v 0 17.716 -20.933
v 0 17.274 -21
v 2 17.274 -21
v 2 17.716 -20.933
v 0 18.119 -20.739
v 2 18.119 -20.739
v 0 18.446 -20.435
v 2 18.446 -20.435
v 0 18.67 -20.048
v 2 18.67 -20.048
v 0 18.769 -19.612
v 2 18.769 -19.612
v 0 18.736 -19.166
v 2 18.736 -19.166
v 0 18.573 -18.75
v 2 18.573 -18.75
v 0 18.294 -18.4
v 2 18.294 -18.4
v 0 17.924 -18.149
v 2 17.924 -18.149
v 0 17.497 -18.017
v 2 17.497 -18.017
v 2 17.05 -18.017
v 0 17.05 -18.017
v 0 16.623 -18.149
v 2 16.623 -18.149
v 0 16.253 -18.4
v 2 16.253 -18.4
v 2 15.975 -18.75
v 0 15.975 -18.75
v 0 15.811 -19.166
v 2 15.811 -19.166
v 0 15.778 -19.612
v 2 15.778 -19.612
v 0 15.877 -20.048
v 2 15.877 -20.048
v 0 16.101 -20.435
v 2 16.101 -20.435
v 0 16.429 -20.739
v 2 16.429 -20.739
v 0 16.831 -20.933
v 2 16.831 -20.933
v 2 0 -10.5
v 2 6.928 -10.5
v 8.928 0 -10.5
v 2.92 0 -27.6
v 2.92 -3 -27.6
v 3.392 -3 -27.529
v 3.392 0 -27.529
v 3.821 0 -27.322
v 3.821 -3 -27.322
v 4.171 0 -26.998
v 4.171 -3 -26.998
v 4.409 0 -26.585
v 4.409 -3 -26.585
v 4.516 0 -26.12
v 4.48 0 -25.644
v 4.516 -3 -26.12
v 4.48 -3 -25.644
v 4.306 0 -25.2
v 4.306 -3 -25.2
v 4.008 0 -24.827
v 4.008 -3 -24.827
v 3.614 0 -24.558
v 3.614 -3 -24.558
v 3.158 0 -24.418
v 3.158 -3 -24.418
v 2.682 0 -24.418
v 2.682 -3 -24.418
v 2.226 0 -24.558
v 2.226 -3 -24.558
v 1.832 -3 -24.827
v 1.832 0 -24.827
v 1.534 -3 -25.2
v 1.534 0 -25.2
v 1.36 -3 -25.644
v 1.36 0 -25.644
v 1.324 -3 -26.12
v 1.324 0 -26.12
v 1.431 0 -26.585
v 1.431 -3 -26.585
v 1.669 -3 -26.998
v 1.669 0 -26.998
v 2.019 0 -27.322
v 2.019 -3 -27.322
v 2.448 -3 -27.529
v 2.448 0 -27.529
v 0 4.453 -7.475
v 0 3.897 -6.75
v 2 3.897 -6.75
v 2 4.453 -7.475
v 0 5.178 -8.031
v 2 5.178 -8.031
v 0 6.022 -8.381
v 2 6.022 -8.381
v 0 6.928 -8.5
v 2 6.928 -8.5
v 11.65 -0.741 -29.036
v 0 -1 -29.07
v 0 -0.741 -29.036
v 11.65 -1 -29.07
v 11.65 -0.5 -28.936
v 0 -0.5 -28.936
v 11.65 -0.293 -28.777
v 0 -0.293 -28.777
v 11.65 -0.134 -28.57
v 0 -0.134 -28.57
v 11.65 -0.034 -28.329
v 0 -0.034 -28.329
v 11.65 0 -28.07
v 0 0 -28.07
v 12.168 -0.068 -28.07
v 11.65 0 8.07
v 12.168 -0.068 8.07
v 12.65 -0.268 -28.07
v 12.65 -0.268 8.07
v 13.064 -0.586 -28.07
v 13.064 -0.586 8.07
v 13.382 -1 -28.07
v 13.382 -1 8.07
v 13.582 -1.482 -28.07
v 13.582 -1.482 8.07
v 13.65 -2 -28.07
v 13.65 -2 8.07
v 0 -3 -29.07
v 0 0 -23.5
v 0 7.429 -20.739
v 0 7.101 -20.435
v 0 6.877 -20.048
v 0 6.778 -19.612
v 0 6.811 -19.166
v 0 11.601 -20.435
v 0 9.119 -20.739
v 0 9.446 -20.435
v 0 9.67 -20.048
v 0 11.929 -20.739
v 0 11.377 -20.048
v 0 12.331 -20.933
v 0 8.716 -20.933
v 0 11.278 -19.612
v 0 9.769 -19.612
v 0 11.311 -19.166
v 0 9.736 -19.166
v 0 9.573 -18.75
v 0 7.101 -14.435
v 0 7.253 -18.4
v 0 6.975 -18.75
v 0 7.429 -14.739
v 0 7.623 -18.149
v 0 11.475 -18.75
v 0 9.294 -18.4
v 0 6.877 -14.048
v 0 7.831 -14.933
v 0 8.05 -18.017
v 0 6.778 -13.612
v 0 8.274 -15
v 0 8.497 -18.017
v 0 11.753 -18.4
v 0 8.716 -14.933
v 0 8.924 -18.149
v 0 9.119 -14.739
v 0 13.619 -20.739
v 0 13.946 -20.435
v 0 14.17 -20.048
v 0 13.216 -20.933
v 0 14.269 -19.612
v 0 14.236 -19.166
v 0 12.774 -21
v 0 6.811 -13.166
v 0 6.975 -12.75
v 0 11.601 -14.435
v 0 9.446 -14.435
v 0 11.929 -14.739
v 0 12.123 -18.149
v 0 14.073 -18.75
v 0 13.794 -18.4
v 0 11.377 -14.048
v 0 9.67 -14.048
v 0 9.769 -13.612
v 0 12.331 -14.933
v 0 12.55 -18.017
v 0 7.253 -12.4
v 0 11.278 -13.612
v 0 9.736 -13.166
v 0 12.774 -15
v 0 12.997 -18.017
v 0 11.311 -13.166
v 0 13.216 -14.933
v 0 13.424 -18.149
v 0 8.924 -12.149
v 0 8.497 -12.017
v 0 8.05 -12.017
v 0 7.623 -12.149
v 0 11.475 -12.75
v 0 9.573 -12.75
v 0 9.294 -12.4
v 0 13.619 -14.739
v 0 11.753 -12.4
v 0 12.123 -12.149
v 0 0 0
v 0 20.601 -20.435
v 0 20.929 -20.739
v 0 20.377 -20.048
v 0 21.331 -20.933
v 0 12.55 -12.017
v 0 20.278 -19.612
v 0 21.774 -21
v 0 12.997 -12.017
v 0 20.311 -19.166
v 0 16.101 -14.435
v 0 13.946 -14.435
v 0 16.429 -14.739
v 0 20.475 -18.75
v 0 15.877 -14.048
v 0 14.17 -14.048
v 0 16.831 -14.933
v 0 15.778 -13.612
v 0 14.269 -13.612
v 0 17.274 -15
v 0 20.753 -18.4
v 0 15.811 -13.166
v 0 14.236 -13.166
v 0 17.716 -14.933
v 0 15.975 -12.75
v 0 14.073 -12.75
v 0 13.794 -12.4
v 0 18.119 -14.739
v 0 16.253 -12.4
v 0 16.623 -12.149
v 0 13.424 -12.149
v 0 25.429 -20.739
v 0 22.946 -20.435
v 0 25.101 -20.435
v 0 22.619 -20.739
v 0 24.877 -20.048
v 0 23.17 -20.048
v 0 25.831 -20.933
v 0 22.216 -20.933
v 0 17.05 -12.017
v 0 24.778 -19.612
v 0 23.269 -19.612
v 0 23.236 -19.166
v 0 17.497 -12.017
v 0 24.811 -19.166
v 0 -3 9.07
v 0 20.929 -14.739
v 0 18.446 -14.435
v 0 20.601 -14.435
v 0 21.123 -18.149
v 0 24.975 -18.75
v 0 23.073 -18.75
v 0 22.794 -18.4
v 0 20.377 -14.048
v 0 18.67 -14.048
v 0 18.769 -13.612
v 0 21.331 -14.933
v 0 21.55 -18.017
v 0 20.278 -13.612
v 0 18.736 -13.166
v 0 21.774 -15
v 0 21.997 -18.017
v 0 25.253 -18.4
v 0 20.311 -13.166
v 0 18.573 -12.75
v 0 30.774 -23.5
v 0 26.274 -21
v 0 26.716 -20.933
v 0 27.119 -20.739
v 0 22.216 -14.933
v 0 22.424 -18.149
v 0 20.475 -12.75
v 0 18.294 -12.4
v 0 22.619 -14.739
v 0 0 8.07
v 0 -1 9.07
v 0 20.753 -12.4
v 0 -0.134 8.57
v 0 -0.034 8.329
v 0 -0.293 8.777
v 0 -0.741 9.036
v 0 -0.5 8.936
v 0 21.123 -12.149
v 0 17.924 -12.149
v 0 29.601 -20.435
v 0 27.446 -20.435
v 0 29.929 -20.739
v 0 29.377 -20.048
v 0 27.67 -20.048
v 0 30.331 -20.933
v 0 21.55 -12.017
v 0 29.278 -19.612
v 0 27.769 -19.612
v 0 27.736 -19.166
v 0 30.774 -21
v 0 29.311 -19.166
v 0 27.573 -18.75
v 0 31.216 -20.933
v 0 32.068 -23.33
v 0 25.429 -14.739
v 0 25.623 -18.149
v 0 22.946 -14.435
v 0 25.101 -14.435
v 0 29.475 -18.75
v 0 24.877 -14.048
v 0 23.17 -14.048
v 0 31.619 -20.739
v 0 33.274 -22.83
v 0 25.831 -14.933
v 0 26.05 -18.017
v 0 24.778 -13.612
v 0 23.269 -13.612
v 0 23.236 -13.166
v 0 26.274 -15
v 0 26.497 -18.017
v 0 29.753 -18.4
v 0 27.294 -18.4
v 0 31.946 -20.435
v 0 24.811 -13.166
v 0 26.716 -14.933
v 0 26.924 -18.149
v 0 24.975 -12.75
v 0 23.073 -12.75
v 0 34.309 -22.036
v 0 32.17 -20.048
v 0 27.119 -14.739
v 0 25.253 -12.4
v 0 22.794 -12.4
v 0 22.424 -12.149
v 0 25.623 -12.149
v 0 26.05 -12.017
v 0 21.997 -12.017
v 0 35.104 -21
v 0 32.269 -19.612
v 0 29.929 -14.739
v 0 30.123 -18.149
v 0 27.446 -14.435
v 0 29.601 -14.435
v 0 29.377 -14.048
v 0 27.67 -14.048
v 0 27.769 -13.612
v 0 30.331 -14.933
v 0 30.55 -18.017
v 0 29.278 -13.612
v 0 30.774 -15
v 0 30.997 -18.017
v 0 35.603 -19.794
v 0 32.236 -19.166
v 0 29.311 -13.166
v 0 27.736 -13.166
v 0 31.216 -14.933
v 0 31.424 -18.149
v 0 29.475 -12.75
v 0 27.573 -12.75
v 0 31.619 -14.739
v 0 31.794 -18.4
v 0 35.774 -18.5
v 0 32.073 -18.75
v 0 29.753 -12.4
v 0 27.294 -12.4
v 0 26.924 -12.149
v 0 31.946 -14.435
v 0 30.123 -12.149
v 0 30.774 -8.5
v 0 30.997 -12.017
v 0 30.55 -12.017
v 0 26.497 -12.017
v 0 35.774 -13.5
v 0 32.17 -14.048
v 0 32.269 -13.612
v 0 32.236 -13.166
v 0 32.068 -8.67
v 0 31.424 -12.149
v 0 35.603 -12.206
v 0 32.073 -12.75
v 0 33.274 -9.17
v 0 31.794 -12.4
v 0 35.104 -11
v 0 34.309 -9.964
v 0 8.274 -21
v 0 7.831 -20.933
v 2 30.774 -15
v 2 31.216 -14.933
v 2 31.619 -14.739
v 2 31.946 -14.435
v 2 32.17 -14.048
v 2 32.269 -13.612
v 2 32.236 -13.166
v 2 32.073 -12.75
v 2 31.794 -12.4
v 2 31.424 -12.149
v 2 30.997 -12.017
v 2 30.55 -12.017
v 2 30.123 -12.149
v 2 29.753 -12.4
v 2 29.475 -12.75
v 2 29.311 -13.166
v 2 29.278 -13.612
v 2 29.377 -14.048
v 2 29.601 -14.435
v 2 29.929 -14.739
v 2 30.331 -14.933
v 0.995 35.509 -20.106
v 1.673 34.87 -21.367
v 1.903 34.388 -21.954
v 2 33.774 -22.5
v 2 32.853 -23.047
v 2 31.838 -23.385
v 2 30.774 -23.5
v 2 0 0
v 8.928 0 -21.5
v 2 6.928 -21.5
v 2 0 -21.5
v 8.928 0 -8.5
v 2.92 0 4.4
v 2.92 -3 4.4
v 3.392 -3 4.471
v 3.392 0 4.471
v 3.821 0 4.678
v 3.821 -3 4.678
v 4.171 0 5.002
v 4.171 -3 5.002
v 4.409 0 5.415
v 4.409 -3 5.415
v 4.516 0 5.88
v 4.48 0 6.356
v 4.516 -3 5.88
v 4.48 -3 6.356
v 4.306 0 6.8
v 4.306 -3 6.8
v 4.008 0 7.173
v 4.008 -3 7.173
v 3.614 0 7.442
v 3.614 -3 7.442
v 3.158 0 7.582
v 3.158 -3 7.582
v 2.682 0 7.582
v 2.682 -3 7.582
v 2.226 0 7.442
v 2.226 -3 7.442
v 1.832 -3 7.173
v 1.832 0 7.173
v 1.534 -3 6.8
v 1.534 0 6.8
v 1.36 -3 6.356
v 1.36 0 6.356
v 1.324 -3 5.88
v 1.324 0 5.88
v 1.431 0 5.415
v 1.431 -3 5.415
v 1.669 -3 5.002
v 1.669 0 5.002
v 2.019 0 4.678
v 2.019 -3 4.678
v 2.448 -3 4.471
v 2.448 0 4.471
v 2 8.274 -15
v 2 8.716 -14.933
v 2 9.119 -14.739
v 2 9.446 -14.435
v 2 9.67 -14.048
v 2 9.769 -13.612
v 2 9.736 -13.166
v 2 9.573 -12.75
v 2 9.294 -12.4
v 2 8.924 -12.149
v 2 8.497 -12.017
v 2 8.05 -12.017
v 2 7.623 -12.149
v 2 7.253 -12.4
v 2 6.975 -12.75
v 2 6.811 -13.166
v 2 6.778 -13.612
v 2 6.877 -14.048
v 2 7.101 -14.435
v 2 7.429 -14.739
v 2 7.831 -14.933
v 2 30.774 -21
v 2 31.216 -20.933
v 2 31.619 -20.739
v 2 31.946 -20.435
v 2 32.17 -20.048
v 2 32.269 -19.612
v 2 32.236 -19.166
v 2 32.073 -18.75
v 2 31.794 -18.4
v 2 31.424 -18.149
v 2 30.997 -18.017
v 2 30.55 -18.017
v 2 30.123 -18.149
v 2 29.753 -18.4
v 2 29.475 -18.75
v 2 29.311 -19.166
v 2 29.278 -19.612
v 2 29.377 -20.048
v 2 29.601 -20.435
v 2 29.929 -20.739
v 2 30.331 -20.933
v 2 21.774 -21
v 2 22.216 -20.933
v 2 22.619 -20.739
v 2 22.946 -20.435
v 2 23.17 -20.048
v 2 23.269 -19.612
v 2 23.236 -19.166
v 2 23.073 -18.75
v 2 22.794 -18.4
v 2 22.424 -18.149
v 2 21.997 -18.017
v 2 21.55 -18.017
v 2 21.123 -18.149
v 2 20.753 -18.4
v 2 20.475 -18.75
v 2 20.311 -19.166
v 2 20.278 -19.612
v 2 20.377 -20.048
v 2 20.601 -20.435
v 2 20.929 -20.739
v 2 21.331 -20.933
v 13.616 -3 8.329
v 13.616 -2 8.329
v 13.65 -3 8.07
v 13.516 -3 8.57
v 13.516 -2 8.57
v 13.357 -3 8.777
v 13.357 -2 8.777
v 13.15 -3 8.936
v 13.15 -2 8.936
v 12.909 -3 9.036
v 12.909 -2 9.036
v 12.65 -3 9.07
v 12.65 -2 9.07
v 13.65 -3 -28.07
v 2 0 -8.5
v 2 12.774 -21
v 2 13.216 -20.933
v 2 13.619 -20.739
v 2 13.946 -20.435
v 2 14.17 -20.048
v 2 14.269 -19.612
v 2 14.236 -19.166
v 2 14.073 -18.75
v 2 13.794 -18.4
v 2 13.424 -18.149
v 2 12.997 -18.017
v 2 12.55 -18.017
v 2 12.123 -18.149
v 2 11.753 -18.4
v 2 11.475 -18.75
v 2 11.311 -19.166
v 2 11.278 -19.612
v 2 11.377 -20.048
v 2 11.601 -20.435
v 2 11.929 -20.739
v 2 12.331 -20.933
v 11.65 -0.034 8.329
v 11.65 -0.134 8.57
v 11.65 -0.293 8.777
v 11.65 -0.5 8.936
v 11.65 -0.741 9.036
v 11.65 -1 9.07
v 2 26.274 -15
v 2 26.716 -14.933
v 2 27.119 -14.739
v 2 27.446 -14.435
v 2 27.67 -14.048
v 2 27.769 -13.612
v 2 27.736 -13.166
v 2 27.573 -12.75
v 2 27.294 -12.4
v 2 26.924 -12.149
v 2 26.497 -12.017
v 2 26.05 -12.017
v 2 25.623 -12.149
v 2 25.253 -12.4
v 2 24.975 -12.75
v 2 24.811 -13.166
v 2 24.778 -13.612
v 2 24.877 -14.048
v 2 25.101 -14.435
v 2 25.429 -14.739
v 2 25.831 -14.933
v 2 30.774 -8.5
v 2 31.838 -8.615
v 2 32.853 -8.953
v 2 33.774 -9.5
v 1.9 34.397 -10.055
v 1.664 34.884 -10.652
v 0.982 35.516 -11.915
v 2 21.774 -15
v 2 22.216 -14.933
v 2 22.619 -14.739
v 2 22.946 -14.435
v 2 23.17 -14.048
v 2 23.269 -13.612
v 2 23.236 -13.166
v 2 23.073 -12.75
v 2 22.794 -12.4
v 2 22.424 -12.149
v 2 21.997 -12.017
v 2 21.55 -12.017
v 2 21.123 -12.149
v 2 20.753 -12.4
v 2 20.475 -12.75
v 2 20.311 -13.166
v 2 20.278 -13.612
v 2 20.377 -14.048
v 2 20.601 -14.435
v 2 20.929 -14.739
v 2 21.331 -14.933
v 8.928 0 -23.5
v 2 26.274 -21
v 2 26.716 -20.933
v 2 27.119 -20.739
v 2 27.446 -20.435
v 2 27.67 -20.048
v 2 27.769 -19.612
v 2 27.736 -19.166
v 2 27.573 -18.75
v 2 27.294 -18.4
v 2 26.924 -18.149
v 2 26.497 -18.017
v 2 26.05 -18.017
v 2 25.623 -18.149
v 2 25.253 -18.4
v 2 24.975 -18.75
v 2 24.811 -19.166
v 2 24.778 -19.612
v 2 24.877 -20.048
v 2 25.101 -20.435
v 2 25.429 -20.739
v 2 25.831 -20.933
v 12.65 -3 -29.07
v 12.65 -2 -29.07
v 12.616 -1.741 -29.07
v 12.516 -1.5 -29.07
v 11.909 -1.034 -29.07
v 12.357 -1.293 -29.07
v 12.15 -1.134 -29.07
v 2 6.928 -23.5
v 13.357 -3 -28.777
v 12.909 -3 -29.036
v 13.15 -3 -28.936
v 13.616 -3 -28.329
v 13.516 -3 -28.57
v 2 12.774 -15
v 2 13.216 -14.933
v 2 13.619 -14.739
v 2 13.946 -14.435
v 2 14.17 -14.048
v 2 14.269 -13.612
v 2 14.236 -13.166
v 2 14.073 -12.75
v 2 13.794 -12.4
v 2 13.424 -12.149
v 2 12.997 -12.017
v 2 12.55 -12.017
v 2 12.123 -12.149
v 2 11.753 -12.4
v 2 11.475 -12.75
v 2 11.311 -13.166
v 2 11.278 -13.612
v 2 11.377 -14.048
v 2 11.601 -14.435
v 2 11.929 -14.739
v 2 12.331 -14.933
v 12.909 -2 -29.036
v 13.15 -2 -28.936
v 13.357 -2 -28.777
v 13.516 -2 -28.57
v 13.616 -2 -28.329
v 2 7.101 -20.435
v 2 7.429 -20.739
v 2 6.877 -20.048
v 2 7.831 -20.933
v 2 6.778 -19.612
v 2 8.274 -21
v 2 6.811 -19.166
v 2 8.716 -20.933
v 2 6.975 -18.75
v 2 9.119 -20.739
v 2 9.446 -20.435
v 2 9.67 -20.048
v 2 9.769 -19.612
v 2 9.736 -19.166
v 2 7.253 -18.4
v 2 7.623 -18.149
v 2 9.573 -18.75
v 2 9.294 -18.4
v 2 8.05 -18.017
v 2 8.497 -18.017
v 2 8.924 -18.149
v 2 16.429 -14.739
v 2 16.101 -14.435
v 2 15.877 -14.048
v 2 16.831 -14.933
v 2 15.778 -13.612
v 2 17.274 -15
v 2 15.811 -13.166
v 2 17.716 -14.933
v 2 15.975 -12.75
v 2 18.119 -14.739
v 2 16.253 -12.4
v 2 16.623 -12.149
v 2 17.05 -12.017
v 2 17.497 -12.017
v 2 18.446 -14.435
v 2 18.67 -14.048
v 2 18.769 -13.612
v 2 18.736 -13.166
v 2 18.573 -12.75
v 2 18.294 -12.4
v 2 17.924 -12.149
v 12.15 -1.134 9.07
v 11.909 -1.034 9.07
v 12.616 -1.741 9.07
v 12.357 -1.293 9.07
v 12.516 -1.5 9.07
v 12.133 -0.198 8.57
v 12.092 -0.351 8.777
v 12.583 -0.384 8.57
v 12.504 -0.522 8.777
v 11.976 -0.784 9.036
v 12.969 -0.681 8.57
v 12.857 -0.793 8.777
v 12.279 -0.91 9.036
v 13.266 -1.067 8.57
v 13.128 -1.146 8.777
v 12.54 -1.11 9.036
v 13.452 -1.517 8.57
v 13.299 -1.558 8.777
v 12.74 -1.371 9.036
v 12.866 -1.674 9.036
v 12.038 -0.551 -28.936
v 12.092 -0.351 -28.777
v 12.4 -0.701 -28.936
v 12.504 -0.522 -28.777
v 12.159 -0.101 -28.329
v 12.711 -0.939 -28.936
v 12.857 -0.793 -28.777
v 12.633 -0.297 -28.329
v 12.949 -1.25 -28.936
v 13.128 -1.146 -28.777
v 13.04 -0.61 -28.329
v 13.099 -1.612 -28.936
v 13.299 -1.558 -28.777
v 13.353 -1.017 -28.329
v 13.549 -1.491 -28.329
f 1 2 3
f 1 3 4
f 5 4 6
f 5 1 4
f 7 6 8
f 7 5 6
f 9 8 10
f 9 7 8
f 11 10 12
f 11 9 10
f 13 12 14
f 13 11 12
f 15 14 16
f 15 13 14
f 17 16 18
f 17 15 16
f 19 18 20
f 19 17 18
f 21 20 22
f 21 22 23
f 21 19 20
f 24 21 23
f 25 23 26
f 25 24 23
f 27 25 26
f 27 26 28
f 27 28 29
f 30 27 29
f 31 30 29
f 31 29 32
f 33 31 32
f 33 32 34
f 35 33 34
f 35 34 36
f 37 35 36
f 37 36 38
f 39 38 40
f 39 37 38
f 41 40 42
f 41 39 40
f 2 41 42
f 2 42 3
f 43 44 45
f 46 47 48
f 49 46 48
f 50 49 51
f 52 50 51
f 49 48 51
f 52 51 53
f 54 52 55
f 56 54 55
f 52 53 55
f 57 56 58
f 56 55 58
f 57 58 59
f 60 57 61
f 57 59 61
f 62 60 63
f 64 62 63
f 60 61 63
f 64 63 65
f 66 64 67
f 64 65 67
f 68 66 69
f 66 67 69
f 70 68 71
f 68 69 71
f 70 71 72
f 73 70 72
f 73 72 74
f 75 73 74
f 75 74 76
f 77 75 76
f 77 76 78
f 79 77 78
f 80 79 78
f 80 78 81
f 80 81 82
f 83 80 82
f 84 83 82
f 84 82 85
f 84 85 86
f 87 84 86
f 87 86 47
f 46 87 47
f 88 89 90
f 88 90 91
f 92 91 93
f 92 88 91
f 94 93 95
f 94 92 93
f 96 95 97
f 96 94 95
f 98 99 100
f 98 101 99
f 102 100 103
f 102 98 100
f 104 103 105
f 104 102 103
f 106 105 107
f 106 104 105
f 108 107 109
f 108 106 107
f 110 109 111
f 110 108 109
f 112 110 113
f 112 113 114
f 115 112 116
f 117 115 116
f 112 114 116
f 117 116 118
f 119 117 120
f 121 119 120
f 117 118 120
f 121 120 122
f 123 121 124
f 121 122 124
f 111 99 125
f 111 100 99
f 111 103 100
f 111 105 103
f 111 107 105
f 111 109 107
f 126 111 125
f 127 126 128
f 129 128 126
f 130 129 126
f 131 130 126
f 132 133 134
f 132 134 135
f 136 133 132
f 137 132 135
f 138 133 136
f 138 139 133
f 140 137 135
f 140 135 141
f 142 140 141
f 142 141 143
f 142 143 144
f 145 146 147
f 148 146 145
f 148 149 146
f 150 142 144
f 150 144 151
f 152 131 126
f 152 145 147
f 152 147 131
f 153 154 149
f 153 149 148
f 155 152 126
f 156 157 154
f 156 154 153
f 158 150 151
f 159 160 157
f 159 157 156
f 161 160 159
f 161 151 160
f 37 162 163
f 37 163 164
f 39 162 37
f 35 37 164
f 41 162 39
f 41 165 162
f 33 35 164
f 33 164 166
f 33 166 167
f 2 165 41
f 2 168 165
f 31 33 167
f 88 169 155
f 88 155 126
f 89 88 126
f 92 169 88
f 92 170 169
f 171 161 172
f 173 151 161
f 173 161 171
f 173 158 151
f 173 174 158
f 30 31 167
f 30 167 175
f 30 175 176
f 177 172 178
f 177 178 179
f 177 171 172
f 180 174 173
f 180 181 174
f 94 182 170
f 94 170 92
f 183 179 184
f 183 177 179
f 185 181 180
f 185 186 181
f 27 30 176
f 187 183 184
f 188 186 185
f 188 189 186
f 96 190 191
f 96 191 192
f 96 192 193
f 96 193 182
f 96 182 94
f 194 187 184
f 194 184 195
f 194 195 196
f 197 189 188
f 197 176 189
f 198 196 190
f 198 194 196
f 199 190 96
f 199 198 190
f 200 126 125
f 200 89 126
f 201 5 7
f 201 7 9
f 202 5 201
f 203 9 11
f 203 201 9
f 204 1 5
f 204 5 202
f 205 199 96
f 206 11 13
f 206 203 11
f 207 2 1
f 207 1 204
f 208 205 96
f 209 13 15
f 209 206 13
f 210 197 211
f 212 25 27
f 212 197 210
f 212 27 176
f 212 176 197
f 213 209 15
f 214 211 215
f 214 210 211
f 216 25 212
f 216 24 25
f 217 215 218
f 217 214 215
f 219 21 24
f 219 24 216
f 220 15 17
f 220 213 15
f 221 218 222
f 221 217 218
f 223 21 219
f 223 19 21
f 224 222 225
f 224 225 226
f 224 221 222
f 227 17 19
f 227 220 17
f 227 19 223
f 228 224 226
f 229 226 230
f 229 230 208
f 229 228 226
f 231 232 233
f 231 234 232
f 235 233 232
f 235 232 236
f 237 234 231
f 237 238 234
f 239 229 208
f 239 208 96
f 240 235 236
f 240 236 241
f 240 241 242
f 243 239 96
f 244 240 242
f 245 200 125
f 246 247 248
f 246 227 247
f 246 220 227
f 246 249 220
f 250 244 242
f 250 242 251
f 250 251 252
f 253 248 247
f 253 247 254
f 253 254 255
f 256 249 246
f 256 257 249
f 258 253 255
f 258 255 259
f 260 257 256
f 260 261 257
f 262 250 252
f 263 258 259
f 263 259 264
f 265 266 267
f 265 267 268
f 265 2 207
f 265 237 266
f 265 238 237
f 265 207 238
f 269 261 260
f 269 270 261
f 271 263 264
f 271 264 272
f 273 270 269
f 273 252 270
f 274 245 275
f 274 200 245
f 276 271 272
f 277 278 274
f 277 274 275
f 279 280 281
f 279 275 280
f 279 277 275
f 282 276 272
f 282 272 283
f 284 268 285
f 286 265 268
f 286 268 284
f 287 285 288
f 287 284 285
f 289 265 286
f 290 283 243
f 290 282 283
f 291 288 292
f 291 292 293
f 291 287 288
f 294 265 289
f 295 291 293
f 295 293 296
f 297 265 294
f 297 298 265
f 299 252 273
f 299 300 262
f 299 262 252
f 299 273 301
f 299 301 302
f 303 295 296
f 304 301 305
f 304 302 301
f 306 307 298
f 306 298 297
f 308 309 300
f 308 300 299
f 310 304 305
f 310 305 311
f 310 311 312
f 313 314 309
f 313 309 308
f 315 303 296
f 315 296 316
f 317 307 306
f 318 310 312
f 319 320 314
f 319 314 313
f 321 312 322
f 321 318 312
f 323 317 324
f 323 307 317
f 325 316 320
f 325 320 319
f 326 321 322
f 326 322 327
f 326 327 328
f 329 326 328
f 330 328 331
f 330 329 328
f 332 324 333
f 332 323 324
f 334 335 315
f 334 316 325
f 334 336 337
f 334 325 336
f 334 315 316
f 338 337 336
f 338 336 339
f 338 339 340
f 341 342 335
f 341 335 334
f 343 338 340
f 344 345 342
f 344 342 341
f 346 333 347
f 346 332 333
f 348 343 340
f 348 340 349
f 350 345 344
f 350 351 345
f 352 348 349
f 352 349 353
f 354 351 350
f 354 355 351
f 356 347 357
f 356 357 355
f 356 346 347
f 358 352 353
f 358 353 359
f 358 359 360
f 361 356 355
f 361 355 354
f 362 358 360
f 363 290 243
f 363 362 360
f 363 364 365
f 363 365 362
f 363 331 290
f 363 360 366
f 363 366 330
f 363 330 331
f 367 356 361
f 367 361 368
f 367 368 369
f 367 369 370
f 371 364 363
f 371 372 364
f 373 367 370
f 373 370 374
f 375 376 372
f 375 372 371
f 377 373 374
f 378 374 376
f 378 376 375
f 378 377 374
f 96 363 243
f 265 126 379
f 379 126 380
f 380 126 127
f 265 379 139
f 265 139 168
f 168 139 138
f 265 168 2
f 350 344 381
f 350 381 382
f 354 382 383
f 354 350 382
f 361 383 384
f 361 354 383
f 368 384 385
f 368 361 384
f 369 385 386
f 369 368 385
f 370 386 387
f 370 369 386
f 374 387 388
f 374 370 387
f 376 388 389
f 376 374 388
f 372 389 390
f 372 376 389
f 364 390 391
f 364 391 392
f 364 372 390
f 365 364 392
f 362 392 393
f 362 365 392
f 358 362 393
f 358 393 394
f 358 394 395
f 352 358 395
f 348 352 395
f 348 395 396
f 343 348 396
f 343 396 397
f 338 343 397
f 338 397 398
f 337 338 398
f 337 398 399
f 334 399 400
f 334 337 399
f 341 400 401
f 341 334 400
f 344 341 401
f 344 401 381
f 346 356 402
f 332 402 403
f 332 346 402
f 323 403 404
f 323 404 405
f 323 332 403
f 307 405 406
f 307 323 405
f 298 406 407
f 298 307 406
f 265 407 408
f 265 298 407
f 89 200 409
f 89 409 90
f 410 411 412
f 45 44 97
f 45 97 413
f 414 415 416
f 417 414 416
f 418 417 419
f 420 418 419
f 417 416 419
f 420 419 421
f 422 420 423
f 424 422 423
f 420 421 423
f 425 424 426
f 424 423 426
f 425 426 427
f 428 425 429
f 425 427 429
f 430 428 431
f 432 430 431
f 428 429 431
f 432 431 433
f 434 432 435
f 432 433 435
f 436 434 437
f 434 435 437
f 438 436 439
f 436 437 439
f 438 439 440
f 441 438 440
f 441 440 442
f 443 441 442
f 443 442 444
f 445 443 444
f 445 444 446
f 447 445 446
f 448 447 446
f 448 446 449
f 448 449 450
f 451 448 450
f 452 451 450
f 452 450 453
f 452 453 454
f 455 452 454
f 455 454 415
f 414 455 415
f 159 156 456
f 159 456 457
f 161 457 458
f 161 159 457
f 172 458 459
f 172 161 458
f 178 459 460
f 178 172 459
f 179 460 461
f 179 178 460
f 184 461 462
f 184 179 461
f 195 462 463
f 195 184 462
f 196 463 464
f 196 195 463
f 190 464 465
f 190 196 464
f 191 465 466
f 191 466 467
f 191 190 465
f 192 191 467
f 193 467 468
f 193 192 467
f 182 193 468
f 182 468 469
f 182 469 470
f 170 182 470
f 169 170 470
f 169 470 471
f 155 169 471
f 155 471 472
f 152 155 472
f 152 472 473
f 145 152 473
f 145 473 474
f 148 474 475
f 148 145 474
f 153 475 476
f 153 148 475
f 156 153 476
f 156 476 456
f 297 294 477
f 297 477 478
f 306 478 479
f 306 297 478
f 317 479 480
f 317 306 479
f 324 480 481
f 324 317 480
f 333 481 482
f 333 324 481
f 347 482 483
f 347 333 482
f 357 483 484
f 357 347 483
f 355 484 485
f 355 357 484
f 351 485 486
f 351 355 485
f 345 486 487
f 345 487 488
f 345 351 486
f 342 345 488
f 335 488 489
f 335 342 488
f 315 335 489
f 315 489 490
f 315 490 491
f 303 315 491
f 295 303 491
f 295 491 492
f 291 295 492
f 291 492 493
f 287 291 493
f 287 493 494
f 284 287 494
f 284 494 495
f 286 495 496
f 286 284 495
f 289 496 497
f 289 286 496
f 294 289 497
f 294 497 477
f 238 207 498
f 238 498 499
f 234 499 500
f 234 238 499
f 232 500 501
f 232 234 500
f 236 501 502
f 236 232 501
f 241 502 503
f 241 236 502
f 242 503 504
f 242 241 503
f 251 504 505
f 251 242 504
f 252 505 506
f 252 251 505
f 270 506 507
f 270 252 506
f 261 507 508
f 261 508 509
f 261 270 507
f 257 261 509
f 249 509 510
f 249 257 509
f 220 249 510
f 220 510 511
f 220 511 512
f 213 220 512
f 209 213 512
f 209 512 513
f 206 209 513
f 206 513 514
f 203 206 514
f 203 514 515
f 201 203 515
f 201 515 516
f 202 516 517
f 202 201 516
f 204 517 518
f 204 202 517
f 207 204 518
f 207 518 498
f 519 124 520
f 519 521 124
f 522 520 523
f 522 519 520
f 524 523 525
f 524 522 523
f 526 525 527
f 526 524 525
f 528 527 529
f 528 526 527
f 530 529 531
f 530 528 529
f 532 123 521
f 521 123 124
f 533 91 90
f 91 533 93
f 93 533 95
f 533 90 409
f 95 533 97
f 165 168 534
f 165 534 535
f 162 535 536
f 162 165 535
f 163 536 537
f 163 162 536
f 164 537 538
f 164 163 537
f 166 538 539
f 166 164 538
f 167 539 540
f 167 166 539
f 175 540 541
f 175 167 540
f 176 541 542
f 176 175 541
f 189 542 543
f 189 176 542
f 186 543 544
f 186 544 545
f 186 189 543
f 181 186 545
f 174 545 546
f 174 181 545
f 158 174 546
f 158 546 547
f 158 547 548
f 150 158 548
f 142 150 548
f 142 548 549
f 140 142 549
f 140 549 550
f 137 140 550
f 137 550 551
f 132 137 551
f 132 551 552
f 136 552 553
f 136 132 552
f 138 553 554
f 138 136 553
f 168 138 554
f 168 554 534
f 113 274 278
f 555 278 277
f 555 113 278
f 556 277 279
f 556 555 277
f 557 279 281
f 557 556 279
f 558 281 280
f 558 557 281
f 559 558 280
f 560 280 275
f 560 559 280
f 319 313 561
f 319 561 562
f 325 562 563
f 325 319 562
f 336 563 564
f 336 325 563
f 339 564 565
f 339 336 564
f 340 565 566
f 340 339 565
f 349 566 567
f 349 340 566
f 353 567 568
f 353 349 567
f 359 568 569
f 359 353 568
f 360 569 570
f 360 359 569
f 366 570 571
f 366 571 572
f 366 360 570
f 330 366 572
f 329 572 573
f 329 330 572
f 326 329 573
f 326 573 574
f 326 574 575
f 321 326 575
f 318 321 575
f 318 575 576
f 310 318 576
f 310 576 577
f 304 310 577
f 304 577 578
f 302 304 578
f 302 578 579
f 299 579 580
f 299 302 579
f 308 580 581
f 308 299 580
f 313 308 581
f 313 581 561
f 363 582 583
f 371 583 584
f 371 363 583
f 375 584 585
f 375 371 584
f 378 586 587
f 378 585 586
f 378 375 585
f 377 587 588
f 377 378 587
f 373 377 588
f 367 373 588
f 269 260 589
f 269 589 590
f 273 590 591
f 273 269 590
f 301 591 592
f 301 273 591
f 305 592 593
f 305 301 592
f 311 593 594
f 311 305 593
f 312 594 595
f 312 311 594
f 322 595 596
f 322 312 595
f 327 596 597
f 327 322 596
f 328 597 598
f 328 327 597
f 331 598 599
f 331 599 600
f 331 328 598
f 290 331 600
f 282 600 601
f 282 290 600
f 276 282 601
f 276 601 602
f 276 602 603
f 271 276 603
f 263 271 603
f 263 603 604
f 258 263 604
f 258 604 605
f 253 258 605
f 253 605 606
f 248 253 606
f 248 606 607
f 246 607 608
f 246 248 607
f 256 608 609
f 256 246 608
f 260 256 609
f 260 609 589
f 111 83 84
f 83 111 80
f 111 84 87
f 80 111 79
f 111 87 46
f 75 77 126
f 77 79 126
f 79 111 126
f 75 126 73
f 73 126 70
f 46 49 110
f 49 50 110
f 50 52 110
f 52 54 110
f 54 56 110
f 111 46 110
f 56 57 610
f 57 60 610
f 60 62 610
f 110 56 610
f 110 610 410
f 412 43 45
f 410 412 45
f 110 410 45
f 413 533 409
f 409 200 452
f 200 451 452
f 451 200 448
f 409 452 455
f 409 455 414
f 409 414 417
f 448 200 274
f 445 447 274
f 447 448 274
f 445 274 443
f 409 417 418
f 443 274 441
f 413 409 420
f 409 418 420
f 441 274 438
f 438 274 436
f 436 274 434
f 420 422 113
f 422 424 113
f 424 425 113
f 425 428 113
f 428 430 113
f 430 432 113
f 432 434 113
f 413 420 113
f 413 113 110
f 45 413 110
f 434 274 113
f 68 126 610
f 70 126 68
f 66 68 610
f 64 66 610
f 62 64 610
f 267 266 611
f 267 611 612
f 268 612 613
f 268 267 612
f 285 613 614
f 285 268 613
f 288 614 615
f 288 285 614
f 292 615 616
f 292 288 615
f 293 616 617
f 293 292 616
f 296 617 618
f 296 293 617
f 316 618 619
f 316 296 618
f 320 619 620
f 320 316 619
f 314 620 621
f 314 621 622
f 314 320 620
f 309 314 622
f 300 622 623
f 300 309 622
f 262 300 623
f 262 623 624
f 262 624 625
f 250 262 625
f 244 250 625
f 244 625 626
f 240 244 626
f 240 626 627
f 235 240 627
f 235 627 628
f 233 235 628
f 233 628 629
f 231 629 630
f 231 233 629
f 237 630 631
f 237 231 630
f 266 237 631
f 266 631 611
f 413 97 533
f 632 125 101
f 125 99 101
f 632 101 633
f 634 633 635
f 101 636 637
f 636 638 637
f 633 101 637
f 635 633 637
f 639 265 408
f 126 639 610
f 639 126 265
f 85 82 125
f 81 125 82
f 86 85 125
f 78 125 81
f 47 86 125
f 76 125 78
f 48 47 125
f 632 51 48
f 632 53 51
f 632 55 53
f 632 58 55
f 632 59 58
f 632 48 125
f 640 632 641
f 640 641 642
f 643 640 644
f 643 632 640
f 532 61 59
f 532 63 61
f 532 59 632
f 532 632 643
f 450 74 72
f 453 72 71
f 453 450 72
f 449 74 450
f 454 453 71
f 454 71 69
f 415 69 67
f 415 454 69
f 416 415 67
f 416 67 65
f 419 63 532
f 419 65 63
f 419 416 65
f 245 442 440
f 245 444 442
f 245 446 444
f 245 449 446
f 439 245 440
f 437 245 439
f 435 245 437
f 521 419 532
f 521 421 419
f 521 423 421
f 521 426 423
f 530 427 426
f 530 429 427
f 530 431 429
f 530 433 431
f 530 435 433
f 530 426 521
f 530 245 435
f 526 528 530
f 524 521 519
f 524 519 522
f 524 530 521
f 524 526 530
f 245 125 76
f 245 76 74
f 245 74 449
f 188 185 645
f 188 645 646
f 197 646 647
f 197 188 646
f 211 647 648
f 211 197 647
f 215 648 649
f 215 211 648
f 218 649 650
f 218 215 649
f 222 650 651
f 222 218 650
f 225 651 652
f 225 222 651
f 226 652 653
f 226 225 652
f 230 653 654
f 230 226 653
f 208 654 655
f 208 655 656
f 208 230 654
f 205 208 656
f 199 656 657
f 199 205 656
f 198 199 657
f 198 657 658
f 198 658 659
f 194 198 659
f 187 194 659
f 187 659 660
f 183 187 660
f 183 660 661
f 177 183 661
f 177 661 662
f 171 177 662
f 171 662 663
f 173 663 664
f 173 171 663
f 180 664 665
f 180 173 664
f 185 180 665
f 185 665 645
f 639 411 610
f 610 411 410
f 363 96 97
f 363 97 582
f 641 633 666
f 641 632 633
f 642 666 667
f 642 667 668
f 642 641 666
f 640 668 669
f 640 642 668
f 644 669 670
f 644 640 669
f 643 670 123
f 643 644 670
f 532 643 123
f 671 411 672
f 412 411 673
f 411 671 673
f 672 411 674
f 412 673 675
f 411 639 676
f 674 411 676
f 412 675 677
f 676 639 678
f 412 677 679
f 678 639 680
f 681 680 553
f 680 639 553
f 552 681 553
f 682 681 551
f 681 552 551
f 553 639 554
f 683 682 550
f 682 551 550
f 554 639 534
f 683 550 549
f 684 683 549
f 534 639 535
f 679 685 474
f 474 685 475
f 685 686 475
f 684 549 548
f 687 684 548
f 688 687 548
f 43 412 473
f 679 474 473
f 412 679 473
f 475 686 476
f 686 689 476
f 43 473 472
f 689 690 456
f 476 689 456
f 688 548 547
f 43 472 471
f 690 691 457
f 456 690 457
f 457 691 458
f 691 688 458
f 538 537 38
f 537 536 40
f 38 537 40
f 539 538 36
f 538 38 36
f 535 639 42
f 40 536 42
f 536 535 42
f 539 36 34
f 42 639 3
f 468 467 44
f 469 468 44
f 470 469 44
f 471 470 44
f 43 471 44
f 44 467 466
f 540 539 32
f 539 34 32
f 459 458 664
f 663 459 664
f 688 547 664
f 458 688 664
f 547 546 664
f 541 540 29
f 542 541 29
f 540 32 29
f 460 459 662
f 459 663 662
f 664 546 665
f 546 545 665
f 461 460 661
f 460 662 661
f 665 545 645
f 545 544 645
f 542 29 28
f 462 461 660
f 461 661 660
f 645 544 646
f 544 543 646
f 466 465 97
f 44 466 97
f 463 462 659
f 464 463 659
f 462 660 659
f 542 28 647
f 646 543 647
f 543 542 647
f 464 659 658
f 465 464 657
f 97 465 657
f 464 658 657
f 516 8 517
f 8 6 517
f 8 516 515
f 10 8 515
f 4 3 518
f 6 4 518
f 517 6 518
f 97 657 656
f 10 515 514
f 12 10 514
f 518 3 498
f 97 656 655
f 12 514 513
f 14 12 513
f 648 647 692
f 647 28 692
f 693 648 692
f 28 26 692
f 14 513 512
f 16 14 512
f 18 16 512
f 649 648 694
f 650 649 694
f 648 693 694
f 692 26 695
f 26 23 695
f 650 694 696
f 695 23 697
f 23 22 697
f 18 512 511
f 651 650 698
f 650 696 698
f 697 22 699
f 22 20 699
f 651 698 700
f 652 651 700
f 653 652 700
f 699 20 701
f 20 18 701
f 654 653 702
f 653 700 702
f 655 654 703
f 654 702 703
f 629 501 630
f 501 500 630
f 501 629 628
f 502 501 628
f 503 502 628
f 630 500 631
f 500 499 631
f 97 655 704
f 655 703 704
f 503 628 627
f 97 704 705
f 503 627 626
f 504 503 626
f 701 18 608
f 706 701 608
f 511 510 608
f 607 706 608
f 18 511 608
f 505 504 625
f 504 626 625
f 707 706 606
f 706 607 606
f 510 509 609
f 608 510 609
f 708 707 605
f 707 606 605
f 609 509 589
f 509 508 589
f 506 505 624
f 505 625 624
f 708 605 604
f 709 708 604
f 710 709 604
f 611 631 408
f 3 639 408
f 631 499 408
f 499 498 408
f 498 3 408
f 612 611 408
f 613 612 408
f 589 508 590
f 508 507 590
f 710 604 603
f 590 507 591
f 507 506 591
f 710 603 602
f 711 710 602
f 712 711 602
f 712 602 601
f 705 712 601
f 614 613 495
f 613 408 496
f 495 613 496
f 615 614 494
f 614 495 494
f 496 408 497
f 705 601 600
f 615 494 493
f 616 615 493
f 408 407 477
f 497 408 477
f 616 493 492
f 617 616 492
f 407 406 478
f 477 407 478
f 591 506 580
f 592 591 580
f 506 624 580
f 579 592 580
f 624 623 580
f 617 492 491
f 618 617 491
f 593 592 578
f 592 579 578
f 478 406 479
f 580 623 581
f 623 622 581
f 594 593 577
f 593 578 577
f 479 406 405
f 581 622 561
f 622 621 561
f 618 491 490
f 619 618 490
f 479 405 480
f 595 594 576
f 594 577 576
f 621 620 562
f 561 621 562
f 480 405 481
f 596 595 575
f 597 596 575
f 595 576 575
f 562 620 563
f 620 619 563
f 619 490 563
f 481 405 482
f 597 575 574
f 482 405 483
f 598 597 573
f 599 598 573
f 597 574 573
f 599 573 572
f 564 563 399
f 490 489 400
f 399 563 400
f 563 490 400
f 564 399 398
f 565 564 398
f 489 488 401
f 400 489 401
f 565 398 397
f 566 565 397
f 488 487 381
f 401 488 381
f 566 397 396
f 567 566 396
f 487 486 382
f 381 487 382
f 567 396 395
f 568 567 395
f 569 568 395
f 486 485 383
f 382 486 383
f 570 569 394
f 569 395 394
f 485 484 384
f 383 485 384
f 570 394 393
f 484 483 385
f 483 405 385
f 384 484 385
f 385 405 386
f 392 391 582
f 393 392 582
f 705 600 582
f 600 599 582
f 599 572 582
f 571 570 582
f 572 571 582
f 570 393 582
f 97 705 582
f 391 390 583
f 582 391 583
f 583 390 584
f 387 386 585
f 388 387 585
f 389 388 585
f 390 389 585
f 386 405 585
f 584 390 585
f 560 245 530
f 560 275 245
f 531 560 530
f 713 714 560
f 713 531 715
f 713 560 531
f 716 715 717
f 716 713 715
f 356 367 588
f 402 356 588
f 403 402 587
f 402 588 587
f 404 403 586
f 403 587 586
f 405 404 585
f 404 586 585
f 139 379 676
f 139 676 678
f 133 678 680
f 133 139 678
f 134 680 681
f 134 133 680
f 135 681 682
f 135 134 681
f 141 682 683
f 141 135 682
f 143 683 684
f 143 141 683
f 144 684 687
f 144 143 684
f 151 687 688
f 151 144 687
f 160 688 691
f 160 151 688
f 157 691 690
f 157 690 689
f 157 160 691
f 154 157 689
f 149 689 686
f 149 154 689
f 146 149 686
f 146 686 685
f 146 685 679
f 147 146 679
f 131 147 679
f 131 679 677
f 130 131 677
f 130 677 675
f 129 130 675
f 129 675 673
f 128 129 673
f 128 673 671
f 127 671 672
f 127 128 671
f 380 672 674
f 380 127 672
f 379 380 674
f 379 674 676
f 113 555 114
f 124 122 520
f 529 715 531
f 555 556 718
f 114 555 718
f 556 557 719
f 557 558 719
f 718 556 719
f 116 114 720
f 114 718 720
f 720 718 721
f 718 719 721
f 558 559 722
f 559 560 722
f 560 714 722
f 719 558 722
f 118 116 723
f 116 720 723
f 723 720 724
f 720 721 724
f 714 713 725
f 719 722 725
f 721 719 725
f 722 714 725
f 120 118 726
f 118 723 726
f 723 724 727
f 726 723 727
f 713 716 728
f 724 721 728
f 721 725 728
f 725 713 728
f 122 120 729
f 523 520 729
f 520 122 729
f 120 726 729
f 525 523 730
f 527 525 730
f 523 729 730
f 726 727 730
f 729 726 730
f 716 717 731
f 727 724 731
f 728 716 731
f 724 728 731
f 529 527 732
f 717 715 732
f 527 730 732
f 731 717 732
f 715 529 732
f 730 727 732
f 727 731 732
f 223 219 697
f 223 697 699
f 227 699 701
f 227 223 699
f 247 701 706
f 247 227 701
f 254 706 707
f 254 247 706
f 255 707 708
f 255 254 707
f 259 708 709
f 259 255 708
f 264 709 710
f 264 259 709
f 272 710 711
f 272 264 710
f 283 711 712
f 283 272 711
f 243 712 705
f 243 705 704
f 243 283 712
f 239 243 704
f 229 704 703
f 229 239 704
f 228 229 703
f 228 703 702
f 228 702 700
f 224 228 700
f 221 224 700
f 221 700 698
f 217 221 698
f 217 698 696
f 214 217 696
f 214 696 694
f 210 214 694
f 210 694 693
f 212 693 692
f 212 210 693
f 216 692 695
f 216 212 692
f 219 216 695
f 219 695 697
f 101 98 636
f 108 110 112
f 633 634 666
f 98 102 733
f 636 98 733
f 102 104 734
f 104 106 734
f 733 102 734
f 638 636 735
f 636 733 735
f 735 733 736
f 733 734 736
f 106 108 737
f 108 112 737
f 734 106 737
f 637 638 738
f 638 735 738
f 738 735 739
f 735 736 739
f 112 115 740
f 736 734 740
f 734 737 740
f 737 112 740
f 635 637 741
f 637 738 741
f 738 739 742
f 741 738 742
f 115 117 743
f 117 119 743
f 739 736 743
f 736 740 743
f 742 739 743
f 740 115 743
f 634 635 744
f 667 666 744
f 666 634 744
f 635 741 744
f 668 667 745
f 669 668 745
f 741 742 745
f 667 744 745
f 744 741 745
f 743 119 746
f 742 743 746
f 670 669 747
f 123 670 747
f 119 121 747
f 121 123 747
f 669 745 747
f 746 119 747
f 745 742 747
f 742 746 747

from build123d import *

# Parameters (mm, degrees)
SKETCH_1_R          = 1.5
EXTRUDE_1_DEPTH     = 2
FILLET_1_R          = 2
SKETCH_2_W          = 13.65
SKETCH_2_H          = 38.14
EXTRUDE_2_DEPTH     = 3
SKETCH_5_R          = 1.6
CUT_EXTRUDE_1_DEPTH = 51.34658541
FILLET_5_R          = 2
FILLET_6_R          = 1
RIB_5_REACH         = 45.465
SKETCH_6_WALL_W     = 98.727749582
SKETCH_6_WALL_H     = 2
RIB_8_REACH         = 52.268
SKETCH_8_WALL_W     = 112.334064404
SKETCH_8_WALL_H     = 2


with BuildPart() as part:
    # 草图1 → 凸台-拉伸1 (new body)
    with BuildSketch(Plane(origin=(0, 0, 0), x_dir=(0, 0, -1), z_dir=(1, 0, 0))):
        with BuildLine():
            Line((8.5, 6.92820323), (8.5, 30.773589654))
            ThreePointArc((8.5, 30.773589654), (9.964466094, 34.30912356), (13.5, 35.773589654))
            Line((13.5, 35.773589654), (18.5, 35.773589654))
            ThreePointArc((18.5, 35.773589654), (22.035533906, 34.30912356), (23.5, 30.773589654))
            Line((23.5, 30.773589654), (23.5, 0))
            Line((23.5, 0), (0, 0))
            Line((0, 0), (6.75, 3.897114317))
            ThreePointArc((6.75, 3.897114317), (8.031088913, 5.17820323), (8.5, 6.92820323))
        make_face()
        with Locations((19.5, 30.773589654)):
            Circle(SKETCH_1_R, mode=Mode.SUBTRACT)
        with Locations((13.5, 30.773589654)):
            Circle(SKETCH_1_R, mode=Mode.SUBTRACT)
        with Locations((19.5, 26.273589654)):
            Circle(SKETCH_1_R, mode=Mode.SUBTRACT)
        with Locations((13.5, 26.273589654)):
            Circle(SKETCH_1_R, mode=Mode.SUBTRACT)
        with Locations((19.5, 21.773589654)):
            Circle(SKETCH_1_R, mode=Mode.SUBTRACT)
        with Locations((13.5, 21.773589654)):
            Circle(SKETCH_1_R, mode=Mode.SUBTRACT)
        with Locations((19.5, 17.273589654)):
            Circle(SKETCH_1_R, mode=Mode.SUBTRACT)
        with Locations((13.5, 17.273589654)):
            Circle(SKETCH_1_R, mode=Mode.SUBTRACT)
        with Locations((19.5, 12.773589654)):
            Circle(SKETCH_1_R, mode=Mode.SUBTRACT)
        with Locations((13.5, 12.773589654)):
            Circle(SKETCH_1_R, mode=Mode.SUBTRACT)
        with Locations((19.5, 8.273589654)):
            Circle(SKETCH_1_R, mode=Mode.SUBTRACT)
        with Locations((13.5, 8.273589654)):
            Circle(SKETCH_1_R, mode=Mode.SUBTRACT)
    extrude(amount=EXTRUDE_1_DEPTH)

    # 圆角1
    # the kernel refuses this fillet: 2 mm, written as the material it takes off along each edge
    with BuildSketch(Plane(origin=(2, 35.773589654, -8.5), x_dir=(-1, 0, 0), z_dir=(0, 0, -1))) as fillet_1_piece_1:
        with BuildLine():
            CenterArc((FILLET_1_R, -FILLET_1_R), FILLET_1_R, 90, 90)
            Line((0, -FILLET_1_R), (0, 0))
            Line((0, 0), (FILLET_1_R, 0))
        make_face()
    extrude(amount=15, mode=Mode.SUBTRACT)

    # 草图2 → 凸台-拉伸2 (add)
    with BuildSketch(Plane.XZ):
        with Locations((6.825, -10)):
            Rectangle(SKETCH_2_W, SKETCH_2_H)
    extrude(amount=EXTRUDE_2_DEPTH)

    # 草图5 → 切除-拉伸1 (cut, through all)
    with BuildSketch(Plane.XZ.offset(3)):
        with Locations(Location((2.92, 6, 0), (0, 0, 270))):
            Circle(SKETCH_5_R)
        with Locations(Location((2.92, -26, 0), (0, 0, 270))):
            Circle(SKETCH_5_R)
    extrude(amount=-CUT_EXTRUDE_1_DEPTH, mode=Mode.SUBTRACT)

    # 圆角5
    fillet_5_edges = [part.edges().sort_by_distance(p)[0] for p in [
        (13.65, 0, -10),
    ]]
    fillet(fillet_5_edges, radius=FILLET_5_R)

    # 圆角6
    fillet_6_edges = [part.edges().sort_by_distance(p)[0] for p in [
        (5.825, 0, 9.07),
        (13.064213562, -0.585786438, 9.07),
        (13.064213562, -0.585786438, -29.07),
        (5.825, 0, -29.07),
        (13.65, -2.5, -29.07),
        (13.65, -2.5, 9.07),
    ]]
    fillet(fillet_6_edges, radius=FILLET_6_R)

    # 草图6 wall → 筋5 (add, up to next)
    with BuildSketch(Plane(origin=(5.464101615, 3.464101615, -8.5), x_dir=(0.707106781187, -0.707106781187, 0), z_dir=(0.707106781187, 0.707106781187, 0)), mode=Mode.PRIVATE) as rib_5_sk1:
        with Locations((0, 1)):
            Rectangle(SKETCH_6_WALL_W, SKETCH_6_WALL_H)
    rib_5_tool1 = extrude(rib_5_sk1.sketch, amount=-RIB_5_REACH, mode=Mode.PRIVATE) - part.part
    add(rib_5_tool1.solids().sort_by_distance((5.464101615, 3.464101615, -8.5))[0])

    # 草图8 wall → 筋8 (add, up to next)
    with BuildSketch(Plane(origin=(5.464101615, 3.464101615, -23.5), x_dir=(0.707106781187, -0.707106781187, 0), z_dir=(-0.707106781187, -0.707106781187, 0)), mode=Mode.PRIVATE) as rib_8_sk1:
        with Locations((0, 1)):
            Rectangle(SKETCH_8_WALL_W, SKETCH_8_WALL_H)
    rib_8_tool1 = extrude(rib_8_sk1.sketch, amount=RIB_8_REACH, mode=Mode.PRIVATE) - part.part
    add(rib_8_tool1.solids().sort_by_distance((5.464101615, 3.464101615, -23.5))[0])


solid = part.part
